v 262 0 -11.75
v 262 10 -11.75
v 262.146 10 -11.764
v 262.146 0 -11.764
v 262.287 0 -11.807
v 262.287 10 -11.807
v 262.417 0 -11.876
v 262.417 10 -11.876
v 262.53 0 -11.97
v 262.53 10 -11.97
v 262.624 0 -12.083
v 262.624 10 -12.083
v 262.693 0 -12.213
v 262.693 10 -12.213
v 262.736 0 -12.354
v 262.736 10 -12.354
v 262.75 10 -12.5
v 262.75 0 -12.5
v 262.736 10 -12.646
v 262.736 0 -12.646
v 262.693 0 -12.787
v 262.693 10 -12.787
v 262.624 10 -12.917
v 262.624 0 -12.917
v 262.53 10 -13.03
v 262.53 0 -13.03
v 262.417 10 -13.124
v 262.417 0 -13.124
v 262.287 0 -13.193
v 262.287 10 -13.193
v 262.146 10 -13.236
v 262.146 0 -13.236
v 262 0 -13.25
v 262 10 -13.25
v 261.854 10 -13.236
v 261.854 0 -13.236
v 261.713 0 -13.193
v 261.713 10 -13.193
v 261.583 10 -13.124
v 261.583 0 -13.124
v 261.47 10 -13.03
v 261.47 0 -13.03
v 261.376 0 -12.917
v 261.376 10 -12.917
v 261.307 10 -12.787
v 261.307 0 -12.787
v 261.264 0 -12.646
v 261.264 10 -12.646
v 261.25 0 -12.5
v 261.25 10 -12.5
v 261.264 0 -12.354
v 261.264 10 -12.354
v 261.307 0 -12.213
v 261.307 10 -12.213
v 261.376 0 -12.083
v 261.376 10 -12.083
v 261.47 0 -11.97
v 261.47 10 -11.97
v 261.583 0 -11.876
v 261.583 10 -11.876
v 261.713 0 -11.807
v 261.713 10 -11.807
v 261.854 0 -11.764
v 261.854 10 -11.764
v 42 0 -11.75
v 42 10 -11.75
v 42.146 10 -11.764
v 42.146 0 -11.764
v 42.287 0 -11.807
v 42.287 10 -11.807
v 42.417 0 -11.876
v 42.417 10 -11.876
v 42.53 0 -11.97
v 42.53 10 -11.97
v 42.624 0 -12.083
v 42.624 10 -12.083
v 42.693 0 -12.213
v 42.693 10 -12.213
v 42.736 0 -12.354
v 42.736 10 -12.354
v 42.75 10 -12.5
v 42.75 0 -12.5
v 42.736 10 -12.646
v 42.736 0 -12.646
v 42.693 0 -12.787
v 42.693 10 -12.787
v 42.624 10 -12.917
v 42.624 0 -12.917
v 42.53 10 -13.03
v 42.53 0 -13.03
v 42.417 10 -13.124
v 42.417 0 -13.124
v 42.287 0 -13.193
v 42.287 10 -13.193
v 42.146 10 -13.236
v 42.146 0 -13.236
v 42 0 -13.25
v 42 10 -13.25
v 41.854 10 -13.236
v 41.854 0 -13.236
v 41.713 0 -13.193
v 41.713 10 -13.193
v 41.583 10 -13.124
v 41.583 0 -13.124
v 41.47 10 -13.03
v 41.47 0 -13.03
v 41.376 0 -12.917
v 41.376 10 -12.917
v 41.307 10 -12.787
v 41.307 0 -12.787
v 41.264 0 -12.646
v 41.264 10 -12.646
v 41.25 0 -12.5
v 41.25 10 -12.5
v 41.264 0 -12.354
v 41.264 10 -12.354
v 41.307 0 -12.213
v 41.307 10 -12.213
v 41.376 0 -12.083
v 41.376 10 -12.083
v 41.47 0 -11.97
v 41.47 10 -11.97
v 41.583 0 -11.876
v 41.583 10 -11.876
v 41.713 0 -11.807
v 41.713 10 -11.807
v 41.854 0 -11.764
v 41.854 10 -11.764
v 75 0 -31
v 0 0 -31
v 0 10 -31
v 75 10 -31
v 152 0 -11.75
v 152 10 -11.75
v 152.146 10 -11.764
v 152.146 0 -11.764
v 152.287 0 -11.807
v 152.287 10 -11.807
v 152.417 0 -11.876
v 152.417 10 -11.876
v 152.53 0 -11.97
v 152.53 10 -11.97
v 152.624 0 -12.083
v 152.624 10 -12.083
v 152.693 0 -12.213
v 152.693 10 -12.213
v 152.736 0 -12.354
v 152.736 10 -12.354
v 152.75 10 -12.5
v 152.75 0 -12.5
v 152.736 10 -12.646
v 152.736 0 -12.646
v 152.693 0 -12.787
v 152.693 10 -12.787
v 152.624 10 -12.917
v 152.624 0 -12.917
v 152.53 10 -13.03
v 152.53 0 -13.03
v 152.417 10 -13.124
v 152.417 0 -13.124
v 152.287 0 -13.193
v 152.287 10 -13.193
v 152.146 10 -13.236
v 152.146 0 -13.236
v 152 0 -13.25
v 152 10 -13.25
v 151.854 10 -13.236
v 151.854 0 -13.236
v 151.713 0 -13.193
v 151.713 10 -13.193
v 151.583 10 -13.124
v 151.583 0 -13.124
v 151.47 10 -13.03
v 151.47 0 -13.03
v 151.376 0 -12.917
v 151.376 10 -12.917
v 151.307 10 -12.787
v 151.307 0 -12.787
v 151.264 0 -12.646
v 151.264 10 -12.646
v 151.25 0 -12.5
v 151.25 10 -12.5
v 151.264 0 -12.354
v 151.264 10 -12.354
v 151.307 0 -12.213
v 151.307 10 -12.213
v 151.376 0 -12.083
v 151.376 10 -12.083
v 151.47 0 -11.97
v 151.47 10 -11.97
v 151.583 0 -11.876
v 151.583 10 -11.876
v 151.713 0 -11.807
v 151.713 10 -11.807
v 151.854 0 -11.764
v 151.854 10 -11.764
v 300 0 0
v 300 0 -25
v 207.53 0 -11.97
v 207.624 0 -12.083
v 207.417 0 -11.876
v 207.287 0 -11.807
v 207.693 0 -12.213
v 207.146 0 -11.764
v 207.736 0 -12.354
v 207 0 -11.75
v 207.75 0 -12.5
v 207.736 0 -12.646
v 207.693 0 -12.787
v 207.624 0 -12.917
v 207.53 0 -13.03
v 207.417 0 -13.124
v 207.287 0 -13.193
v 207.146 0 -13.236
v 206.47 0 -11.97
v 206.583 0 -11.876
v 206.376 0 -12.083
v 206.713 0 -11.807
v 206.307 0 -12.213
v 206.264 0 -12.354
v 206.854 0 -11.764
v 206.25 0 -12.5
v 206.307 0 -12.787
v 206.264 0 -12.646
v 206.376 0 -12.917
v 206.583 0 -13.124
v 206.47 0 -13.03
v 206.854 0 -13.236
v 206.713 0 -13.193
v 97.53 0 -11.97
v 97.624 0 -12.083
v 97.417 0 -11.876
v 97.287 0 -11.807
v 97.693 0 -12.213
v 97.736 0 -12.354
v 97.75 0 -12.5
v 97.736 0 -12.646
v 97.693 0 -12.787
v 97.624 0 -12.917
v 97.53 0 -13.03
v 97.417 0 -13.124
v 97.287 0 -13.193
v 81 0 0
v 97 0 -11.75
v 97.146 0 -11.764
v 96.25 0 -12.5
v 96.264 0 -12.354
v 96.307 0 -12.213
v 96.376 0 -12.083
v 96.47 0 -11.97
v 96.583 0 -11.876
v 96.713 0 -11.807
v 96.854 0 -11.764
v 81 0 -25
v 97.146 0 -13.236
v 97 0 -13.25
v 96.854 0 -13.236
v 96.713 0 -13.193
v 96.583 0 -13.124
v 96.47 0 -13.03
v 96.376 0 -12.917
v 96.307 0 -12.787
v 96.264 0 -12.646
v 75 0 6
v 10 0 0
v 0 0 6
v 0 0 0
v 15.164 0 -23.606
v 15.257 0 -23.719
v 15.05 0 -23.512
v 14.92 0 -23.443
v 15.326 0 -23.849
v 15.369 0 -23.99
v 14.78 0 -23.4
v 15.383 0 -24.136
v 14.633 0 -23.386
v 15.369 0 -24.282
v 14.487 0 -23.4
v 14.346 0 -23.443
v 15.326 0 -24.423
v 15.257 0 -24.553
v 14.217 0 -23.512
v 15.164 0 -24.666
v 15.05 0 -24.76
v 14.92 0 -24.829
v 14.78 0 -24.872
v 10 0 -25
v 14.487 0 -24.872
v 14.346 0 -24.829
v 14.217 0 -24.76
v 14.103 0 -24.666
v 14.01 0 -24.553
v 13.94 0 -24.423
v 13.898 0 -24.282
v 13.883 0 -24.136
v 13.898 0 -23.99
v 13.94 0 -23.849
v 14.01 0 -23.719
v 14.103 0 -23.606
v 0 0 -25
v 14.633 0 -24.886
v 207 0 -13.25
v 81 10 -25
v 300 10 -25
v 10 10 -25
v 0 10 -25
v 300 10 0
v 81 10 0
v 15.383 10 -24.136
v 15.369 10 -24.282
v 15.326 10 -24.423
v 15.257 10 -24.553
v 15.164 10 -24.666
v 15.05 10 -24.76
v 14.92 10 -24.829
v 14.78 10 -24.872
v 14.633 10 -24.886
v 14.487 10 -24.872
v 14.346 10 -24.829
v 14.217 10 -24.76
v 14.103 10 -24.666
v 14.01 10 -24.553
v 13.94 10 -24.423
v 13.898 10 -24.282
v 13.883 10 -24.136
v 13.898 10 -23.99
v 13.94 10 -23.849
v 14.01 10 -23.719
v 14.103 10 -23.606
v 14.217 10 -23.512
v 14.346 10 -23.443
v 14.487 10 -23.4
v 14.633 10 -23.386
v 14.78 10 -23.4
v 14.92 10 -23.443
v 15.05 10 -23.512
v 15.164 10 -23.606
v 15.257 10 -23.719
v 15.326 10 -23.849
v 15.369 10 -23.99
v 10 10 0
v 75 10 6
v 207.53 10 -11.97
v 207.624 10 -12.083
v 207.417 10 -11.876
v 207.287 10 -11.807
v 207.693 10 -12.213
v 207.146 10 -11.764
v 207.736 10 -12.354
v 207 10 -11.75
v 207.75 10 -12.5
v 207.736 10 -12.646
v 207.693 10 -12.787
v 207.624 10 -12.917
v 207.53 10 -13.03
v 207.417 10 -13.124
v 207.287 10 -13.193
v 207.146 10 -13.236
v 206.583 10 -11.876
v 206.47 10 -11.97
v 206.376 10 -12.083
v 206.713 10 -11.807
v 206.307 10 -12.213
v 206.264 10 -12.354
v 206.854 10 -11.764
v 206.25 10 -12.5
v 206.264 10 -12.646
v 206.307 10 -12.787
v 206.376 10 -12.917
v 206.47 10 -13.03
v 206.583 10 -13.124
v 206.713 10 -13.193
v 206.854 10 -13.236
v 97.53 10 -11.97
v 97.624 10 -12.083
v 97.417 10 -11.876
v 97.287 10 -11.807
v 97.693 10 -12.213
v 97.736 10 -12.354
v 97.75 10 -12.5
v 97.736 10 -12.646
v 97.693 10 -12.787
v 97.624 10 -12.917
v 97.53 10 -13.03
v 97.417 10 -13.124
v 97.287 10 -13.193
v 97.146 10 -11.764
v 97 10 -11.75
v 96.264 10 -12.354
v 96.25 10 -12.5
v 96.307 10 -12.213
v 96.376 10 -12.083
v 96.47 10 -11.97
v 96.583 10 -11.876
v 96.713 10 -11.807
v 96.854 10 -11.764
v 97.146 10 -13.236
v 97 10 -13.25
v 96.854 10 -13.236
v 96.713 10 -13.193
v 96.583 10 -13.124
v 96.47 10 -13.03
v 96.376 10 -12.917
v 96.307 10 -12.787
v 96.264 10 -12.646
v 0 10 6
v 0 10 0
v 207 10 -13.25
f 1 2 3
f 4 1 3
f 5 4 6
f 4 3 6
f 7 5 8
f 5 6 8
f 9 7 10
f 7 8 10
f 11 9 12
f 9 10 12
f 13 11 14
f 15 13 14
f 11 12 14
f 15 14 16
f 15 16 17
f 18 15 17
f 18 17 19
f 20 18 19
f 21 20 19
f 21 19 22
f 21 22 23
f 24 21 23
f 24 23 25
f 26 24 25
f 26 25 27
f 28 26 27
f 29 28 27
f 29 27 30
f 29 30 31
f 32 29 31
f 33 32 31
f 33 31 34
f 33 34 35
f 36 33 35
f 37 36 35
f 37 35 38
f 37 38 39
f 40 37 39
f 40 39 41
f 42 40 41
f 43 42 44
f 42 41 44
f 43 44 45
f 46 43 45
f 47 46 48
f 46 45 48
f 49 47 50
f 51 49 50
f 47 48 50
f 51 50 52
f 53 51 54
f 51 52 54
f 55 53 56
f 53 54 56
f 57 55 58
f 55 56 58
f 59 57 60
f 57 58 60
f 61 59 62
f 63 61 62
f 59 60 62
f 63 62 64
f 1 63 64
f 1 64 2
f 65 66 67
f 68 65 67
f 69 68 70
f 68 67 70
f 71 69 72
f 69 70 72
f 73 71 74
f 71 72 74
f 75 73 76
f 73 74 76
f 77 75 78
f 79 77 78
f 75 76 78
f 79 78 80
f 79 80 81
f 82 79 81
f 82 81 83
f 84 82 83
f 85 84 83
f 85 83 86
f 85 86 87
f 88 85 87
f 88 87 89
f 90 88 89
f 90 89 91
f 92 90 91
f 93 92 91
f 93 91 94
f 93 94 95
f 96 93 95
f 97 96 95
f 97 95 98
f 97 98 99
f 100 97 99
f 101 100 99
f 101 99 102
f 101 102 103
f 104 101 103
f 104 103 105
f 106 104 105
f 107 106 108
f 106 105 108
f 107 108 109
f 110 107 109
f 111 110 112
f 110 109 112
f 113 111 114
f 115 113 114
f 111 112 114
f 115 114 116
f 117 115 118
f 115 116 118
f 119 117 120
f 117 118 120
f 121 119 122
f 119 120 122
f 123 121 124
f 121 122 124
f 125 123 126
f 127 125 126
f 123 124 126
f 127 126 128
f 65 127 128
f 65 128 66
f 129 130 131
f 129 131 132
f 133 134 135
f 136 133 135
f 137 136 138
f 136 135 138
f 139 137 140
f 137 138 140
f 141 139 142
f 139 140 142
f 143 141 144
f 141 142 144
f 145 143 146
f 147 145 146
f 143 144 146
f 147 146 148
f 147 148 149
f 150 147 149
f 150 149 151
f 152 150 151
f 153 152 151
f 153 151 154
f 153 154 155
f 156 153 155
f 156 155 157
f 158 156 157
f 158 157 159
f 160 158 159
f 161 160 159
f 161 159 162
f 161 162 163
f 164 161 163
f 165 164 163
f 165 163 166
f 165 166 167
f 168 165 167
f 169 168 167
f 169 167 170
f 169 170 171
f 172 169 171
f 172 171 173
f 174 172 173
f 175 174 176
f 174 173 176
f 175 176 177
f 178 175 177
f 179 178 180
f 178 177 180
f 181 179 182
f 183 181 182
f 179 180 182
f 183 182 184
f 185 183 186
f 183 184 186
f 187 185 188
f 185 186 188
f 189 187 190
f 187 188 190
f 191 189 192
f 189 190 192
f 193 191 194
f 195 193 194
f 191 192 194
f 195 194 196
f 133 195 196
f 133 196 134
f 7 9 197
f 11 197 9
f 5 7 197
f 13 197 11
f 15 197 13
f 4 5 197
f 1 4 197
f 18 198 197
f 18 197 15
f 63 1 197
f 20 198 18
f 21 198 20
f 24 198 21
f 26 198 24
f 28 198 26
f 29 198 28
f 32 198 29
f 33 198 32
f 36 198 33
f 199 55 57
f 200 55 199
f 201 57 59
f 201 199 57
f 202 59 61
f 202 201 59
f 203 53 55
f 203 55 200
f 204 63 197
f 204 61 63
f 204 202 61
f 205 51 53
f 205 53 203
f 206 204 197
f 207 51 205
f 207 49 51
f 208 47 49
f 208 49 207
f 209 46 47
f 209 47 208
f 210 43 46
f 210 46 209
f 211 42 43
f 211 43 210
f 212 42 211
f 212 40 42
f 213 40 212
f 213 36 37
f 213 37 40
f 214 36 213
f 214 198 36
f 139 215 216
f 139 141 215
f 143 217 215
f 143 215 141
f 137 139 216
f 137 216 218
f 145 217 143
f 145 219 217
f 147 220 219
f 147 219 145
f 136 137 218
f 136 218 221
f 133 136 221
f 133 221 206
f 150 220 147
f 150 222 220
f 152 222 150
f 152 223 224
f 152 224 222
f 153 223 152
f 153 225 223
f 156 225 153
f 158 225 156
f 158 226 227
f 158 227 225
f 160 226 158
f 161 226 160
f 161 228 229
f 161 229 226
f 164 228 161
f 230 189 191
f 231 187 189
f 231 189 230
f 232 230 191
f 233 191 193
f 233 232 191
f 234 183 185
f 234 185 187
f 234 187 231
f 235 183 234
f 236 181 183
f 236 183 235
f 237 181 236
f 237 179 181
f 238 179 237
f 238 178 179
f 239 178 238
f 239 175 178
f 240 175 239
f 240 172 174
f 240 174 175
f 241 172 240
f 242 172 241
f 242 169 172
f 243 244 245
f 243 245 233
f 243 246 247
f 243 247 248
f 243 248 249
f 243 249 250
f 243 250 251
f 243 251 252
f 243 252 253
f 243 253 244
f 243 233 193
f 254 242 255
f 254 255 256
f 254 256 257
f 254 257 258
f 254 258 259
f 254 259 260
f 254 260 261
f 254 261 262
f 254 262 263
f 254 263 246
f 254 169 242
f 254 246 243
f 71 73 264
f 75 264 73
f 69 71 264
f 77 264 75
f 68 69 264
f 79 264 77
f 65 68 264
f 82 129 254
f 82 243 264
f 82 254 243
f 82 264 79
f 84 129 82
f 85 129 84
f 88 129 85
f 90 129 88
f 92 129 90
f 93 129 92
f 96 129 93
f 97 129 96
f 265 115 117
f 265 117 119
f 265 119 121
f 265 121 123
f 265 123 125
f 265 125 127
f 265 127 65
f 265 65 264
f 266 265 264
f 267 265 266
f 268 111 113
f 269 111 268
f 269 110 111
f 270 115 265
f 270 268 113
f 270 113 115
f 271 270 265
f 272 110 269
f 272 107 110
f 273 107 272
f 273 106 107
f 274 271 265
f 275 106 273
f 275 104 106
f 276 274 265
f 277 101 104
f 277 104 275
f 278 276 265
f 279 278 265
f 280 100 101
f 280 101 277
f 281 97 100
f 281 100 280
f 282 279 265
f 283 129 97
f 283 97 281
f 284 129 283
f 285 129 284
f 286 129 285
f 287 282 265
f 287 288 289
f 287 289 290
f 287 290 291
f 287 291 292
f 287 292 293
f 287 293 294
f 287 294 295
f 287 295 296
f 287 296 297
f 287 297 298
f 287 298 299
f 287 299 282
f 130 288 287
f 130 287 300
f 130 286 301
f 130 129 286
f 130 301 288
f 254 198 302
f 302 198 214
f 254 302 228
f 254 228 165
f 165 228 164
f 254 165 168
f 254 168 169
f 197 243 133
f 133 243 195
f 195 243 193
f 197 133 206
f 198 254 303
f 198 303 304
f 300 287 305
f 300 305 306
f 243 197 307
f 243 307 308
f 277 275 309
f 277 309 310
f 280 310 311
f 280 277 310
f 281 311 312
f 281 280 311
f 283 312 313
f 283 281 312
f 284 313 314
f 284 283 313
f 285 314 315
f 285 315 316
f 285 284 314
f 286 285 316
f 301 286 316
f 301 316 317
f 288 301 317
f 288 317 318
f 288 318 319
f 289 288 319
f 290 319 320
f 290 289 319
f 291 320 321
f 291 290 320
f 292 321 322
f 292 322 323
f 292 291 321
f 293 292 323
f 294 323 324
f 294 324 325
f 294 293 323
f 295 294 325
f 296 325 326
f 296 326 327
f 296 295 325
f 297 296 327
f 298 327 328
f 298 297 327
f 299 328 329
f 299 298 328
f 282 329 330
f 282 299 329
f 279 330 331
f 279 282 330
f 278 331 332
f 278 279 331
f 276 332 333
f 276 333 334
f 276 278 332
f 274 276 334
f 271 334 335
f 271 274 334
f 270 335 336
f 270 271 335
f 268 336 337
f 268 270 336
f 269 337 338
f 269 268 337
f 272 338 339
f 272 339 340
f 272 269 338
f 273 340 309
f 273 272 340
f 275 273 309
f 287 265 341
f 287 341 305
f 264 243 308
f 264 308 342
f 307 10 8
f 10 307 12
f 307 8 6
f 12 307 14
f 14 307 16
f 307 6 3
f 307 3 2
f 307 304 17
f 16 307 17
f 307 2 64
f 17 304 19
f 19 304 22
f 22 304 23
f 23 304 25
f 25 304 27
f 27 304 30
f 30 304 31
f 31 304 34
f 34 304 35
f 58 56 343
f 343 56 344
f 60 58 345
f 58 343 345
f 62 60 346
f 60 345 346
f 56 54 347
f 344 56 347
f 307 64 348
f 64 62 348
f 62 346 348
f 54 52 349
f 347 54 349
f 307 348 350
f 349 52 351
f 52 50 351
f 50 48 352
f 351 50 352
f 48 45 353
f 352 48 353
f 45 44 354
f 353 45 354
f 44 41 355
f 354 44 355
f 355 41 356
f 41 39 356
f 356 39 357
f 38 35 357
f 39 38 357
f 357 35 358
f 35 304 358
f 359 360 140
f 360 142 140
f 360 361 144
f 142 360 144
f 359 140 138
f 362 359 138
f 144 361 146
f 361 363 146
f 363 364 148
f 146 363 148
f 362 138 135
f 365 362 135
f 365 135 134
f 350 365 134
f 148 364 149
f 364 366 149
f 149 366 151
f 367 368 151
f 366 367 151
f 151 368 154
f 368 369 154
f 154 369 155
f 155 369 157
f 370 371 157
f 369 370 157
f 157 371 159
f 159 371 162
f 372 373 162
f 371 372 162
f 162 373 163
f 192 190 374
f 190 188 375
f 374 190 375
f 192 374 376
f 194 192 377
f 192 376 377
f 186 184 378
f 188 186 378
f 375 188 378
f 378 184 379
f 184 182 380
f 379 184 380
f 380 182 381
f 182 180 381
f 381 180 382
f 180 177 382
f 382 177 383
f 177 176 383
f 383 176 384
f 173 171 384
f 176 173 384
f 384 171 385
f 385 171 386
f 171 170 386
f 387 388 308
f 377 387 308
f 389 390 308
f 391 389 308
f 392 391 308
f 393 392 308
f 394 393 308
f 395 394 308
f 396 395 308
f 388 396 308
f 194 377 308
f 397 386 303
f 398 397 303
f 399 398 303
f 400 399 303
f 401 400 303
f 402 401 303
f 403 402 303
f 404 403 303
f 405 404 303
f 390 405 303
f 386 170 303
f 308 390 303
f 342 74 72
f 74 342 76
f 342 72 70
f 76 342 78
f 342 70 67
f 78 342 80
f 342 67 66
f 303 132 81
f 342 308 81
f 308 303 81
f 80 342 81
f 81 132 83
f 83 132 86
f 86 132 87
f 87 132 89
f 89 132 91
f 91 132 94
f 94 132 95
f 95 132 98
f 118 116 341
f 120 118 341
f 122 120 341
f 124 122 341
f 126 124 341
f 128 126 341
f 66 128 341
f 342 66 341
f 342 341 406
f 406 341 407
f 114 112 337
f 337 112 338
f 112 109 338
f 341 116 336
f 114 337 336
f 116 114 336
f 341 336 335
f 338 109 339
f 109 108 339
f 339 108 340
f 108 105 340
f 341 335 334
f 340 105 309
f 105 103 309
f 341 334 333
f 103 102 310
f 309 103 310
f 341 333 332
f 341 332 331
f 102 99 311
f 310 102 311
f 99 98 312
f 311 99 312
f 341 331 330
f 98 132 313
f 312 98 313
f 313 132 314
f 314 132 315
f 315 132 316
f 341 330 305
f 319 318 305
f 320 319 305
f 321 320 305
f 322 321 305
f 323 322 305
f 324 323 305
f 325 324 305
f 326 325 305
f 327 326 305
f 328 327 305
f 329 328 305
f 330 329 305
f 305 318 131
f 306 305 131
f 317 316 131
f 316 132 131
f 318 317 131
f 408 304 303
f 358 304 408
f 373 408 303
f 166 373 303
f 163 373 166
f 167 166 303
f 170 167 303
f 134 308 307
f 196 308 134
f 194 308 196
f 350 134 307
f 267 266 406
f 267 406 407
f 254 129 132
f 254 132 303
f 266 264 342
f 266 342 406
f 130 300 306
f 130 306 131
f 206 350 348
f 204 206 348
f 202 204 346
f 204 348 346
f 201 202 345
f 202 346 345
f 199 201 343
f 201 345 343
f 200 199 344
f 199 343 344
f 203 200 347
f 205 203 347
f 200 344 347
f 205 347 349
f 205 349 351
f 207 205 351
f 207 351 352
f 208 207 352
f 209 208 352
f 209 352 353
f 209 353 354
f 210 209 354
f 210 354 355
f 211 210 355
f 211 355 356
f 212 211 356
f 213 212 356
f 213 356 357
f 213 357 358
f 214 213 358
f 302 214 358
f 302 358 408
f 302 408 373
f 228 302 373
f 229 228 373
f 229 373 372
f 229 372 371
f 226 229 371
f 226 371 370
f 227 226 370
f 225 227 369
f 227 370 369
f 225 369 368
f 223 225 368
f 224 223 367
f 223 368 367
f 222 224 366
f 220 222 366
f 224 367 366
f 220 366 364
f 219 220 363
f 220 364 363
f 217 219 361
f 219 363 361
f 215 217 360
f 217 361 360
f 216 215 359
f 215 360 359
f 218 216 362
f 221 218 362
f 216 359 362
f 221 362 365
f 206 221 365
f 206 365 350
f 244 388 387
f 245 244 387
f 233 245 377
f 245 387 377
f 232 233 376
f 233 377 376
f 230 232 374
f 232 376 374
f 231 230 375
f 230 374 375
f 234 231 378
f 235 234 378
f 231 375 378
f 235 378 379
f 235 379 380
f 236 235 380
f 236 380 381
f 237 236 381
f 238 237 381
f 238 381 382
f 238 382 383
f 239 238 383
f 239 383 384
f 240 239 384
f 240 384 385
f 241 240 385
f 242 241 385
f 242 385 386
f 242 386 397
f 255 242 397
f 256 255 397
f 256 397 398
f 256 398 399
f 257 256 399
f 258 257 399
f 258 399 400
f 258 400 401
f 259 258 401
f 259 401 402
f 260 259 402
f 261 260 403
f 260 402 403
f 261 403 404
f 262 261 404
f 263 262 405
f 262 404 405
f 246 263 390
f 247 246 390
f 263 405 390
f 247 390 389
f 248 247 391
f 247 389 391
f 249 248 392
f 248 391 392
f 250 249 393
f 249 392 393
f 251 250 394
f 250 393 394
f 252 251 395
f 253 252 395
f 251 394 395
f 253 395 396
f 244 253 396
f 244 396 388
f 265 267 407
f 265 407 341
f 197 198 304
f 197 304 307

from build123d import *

# Parameters (mm, degrees)
EXTRUDE_1_DEPTH        = 10
SKETCH_2_R             = 0.75
CUT_EXTRUDE_1_DEPTH    = 302.763152157
PATTERN_LINEAR_1_COUNT = 5
PATTERN_LINEAR_1_PITCH = 55
OTHER_1_OUTLINE_R      = 0.75
OTHER_1_DEPTH          = 10


# Read off the part's stored shape, not the designer's step: Отверстие1
with BuildPart() as part:
    # Эскиз1 → Бобышка-Вытянуть1 (new body)
    with BuildSketch(Plane(origin=(0, 0, 0), x_dir=(1, 0, 0), z_dir=(0, 1, 0))):
        Polygon((0, 31), (75, 31), (81, 25), (300, 25), (300, 0), (81, 0), (75, -6), (0, -6), (0, 0), (10, 0), (10, 25), (0, 25), align=None)
    extrude(amount=EXTRUDE_1_DEPTH)

    # Эскиз2 → Вырез-Вытянуть1 (cut, through all)
    with BuildSketch(Plane(origin=(0, 10, 0), x_dir=(1, 0, 0), z_dir=(0, 1, 0))):
        with Locations(Location((42, 12.5, 0), (0, 0, 270))):
            Circle(SKETCH_2_R)
    cut_extrude_1 = extrude(amount=-CUT_EXTRUDE_1_DEPTH, mode=Mode.SUBTRACT)

    # Линейный массив1: Вырез-Вытянуть1 ×5
    with Locations(*[(i * PATTERN_LINEAR_1_PITCH, 0, 0) for i in range(1, PATTERN_LINEAR_1_COUNT)]):
        add(cut_extrude_1, mode=Mode.SUBTRACT)

    # Отверстие1 outline → Отверстие1 (cut)
    with BuildSketch(Plane(origin=(0, 0, 0), x_dir=(1, 0, 0), z_dir=(0, 1, 0))):
        with Locations((14.633333886, 24.136000106)):
            Circle(OTHER_1_OUTLINE_R)
    extrude(amount=OTHER_1_DEPTH, mode=Mode.SUBTRACT)


solid = part.part
